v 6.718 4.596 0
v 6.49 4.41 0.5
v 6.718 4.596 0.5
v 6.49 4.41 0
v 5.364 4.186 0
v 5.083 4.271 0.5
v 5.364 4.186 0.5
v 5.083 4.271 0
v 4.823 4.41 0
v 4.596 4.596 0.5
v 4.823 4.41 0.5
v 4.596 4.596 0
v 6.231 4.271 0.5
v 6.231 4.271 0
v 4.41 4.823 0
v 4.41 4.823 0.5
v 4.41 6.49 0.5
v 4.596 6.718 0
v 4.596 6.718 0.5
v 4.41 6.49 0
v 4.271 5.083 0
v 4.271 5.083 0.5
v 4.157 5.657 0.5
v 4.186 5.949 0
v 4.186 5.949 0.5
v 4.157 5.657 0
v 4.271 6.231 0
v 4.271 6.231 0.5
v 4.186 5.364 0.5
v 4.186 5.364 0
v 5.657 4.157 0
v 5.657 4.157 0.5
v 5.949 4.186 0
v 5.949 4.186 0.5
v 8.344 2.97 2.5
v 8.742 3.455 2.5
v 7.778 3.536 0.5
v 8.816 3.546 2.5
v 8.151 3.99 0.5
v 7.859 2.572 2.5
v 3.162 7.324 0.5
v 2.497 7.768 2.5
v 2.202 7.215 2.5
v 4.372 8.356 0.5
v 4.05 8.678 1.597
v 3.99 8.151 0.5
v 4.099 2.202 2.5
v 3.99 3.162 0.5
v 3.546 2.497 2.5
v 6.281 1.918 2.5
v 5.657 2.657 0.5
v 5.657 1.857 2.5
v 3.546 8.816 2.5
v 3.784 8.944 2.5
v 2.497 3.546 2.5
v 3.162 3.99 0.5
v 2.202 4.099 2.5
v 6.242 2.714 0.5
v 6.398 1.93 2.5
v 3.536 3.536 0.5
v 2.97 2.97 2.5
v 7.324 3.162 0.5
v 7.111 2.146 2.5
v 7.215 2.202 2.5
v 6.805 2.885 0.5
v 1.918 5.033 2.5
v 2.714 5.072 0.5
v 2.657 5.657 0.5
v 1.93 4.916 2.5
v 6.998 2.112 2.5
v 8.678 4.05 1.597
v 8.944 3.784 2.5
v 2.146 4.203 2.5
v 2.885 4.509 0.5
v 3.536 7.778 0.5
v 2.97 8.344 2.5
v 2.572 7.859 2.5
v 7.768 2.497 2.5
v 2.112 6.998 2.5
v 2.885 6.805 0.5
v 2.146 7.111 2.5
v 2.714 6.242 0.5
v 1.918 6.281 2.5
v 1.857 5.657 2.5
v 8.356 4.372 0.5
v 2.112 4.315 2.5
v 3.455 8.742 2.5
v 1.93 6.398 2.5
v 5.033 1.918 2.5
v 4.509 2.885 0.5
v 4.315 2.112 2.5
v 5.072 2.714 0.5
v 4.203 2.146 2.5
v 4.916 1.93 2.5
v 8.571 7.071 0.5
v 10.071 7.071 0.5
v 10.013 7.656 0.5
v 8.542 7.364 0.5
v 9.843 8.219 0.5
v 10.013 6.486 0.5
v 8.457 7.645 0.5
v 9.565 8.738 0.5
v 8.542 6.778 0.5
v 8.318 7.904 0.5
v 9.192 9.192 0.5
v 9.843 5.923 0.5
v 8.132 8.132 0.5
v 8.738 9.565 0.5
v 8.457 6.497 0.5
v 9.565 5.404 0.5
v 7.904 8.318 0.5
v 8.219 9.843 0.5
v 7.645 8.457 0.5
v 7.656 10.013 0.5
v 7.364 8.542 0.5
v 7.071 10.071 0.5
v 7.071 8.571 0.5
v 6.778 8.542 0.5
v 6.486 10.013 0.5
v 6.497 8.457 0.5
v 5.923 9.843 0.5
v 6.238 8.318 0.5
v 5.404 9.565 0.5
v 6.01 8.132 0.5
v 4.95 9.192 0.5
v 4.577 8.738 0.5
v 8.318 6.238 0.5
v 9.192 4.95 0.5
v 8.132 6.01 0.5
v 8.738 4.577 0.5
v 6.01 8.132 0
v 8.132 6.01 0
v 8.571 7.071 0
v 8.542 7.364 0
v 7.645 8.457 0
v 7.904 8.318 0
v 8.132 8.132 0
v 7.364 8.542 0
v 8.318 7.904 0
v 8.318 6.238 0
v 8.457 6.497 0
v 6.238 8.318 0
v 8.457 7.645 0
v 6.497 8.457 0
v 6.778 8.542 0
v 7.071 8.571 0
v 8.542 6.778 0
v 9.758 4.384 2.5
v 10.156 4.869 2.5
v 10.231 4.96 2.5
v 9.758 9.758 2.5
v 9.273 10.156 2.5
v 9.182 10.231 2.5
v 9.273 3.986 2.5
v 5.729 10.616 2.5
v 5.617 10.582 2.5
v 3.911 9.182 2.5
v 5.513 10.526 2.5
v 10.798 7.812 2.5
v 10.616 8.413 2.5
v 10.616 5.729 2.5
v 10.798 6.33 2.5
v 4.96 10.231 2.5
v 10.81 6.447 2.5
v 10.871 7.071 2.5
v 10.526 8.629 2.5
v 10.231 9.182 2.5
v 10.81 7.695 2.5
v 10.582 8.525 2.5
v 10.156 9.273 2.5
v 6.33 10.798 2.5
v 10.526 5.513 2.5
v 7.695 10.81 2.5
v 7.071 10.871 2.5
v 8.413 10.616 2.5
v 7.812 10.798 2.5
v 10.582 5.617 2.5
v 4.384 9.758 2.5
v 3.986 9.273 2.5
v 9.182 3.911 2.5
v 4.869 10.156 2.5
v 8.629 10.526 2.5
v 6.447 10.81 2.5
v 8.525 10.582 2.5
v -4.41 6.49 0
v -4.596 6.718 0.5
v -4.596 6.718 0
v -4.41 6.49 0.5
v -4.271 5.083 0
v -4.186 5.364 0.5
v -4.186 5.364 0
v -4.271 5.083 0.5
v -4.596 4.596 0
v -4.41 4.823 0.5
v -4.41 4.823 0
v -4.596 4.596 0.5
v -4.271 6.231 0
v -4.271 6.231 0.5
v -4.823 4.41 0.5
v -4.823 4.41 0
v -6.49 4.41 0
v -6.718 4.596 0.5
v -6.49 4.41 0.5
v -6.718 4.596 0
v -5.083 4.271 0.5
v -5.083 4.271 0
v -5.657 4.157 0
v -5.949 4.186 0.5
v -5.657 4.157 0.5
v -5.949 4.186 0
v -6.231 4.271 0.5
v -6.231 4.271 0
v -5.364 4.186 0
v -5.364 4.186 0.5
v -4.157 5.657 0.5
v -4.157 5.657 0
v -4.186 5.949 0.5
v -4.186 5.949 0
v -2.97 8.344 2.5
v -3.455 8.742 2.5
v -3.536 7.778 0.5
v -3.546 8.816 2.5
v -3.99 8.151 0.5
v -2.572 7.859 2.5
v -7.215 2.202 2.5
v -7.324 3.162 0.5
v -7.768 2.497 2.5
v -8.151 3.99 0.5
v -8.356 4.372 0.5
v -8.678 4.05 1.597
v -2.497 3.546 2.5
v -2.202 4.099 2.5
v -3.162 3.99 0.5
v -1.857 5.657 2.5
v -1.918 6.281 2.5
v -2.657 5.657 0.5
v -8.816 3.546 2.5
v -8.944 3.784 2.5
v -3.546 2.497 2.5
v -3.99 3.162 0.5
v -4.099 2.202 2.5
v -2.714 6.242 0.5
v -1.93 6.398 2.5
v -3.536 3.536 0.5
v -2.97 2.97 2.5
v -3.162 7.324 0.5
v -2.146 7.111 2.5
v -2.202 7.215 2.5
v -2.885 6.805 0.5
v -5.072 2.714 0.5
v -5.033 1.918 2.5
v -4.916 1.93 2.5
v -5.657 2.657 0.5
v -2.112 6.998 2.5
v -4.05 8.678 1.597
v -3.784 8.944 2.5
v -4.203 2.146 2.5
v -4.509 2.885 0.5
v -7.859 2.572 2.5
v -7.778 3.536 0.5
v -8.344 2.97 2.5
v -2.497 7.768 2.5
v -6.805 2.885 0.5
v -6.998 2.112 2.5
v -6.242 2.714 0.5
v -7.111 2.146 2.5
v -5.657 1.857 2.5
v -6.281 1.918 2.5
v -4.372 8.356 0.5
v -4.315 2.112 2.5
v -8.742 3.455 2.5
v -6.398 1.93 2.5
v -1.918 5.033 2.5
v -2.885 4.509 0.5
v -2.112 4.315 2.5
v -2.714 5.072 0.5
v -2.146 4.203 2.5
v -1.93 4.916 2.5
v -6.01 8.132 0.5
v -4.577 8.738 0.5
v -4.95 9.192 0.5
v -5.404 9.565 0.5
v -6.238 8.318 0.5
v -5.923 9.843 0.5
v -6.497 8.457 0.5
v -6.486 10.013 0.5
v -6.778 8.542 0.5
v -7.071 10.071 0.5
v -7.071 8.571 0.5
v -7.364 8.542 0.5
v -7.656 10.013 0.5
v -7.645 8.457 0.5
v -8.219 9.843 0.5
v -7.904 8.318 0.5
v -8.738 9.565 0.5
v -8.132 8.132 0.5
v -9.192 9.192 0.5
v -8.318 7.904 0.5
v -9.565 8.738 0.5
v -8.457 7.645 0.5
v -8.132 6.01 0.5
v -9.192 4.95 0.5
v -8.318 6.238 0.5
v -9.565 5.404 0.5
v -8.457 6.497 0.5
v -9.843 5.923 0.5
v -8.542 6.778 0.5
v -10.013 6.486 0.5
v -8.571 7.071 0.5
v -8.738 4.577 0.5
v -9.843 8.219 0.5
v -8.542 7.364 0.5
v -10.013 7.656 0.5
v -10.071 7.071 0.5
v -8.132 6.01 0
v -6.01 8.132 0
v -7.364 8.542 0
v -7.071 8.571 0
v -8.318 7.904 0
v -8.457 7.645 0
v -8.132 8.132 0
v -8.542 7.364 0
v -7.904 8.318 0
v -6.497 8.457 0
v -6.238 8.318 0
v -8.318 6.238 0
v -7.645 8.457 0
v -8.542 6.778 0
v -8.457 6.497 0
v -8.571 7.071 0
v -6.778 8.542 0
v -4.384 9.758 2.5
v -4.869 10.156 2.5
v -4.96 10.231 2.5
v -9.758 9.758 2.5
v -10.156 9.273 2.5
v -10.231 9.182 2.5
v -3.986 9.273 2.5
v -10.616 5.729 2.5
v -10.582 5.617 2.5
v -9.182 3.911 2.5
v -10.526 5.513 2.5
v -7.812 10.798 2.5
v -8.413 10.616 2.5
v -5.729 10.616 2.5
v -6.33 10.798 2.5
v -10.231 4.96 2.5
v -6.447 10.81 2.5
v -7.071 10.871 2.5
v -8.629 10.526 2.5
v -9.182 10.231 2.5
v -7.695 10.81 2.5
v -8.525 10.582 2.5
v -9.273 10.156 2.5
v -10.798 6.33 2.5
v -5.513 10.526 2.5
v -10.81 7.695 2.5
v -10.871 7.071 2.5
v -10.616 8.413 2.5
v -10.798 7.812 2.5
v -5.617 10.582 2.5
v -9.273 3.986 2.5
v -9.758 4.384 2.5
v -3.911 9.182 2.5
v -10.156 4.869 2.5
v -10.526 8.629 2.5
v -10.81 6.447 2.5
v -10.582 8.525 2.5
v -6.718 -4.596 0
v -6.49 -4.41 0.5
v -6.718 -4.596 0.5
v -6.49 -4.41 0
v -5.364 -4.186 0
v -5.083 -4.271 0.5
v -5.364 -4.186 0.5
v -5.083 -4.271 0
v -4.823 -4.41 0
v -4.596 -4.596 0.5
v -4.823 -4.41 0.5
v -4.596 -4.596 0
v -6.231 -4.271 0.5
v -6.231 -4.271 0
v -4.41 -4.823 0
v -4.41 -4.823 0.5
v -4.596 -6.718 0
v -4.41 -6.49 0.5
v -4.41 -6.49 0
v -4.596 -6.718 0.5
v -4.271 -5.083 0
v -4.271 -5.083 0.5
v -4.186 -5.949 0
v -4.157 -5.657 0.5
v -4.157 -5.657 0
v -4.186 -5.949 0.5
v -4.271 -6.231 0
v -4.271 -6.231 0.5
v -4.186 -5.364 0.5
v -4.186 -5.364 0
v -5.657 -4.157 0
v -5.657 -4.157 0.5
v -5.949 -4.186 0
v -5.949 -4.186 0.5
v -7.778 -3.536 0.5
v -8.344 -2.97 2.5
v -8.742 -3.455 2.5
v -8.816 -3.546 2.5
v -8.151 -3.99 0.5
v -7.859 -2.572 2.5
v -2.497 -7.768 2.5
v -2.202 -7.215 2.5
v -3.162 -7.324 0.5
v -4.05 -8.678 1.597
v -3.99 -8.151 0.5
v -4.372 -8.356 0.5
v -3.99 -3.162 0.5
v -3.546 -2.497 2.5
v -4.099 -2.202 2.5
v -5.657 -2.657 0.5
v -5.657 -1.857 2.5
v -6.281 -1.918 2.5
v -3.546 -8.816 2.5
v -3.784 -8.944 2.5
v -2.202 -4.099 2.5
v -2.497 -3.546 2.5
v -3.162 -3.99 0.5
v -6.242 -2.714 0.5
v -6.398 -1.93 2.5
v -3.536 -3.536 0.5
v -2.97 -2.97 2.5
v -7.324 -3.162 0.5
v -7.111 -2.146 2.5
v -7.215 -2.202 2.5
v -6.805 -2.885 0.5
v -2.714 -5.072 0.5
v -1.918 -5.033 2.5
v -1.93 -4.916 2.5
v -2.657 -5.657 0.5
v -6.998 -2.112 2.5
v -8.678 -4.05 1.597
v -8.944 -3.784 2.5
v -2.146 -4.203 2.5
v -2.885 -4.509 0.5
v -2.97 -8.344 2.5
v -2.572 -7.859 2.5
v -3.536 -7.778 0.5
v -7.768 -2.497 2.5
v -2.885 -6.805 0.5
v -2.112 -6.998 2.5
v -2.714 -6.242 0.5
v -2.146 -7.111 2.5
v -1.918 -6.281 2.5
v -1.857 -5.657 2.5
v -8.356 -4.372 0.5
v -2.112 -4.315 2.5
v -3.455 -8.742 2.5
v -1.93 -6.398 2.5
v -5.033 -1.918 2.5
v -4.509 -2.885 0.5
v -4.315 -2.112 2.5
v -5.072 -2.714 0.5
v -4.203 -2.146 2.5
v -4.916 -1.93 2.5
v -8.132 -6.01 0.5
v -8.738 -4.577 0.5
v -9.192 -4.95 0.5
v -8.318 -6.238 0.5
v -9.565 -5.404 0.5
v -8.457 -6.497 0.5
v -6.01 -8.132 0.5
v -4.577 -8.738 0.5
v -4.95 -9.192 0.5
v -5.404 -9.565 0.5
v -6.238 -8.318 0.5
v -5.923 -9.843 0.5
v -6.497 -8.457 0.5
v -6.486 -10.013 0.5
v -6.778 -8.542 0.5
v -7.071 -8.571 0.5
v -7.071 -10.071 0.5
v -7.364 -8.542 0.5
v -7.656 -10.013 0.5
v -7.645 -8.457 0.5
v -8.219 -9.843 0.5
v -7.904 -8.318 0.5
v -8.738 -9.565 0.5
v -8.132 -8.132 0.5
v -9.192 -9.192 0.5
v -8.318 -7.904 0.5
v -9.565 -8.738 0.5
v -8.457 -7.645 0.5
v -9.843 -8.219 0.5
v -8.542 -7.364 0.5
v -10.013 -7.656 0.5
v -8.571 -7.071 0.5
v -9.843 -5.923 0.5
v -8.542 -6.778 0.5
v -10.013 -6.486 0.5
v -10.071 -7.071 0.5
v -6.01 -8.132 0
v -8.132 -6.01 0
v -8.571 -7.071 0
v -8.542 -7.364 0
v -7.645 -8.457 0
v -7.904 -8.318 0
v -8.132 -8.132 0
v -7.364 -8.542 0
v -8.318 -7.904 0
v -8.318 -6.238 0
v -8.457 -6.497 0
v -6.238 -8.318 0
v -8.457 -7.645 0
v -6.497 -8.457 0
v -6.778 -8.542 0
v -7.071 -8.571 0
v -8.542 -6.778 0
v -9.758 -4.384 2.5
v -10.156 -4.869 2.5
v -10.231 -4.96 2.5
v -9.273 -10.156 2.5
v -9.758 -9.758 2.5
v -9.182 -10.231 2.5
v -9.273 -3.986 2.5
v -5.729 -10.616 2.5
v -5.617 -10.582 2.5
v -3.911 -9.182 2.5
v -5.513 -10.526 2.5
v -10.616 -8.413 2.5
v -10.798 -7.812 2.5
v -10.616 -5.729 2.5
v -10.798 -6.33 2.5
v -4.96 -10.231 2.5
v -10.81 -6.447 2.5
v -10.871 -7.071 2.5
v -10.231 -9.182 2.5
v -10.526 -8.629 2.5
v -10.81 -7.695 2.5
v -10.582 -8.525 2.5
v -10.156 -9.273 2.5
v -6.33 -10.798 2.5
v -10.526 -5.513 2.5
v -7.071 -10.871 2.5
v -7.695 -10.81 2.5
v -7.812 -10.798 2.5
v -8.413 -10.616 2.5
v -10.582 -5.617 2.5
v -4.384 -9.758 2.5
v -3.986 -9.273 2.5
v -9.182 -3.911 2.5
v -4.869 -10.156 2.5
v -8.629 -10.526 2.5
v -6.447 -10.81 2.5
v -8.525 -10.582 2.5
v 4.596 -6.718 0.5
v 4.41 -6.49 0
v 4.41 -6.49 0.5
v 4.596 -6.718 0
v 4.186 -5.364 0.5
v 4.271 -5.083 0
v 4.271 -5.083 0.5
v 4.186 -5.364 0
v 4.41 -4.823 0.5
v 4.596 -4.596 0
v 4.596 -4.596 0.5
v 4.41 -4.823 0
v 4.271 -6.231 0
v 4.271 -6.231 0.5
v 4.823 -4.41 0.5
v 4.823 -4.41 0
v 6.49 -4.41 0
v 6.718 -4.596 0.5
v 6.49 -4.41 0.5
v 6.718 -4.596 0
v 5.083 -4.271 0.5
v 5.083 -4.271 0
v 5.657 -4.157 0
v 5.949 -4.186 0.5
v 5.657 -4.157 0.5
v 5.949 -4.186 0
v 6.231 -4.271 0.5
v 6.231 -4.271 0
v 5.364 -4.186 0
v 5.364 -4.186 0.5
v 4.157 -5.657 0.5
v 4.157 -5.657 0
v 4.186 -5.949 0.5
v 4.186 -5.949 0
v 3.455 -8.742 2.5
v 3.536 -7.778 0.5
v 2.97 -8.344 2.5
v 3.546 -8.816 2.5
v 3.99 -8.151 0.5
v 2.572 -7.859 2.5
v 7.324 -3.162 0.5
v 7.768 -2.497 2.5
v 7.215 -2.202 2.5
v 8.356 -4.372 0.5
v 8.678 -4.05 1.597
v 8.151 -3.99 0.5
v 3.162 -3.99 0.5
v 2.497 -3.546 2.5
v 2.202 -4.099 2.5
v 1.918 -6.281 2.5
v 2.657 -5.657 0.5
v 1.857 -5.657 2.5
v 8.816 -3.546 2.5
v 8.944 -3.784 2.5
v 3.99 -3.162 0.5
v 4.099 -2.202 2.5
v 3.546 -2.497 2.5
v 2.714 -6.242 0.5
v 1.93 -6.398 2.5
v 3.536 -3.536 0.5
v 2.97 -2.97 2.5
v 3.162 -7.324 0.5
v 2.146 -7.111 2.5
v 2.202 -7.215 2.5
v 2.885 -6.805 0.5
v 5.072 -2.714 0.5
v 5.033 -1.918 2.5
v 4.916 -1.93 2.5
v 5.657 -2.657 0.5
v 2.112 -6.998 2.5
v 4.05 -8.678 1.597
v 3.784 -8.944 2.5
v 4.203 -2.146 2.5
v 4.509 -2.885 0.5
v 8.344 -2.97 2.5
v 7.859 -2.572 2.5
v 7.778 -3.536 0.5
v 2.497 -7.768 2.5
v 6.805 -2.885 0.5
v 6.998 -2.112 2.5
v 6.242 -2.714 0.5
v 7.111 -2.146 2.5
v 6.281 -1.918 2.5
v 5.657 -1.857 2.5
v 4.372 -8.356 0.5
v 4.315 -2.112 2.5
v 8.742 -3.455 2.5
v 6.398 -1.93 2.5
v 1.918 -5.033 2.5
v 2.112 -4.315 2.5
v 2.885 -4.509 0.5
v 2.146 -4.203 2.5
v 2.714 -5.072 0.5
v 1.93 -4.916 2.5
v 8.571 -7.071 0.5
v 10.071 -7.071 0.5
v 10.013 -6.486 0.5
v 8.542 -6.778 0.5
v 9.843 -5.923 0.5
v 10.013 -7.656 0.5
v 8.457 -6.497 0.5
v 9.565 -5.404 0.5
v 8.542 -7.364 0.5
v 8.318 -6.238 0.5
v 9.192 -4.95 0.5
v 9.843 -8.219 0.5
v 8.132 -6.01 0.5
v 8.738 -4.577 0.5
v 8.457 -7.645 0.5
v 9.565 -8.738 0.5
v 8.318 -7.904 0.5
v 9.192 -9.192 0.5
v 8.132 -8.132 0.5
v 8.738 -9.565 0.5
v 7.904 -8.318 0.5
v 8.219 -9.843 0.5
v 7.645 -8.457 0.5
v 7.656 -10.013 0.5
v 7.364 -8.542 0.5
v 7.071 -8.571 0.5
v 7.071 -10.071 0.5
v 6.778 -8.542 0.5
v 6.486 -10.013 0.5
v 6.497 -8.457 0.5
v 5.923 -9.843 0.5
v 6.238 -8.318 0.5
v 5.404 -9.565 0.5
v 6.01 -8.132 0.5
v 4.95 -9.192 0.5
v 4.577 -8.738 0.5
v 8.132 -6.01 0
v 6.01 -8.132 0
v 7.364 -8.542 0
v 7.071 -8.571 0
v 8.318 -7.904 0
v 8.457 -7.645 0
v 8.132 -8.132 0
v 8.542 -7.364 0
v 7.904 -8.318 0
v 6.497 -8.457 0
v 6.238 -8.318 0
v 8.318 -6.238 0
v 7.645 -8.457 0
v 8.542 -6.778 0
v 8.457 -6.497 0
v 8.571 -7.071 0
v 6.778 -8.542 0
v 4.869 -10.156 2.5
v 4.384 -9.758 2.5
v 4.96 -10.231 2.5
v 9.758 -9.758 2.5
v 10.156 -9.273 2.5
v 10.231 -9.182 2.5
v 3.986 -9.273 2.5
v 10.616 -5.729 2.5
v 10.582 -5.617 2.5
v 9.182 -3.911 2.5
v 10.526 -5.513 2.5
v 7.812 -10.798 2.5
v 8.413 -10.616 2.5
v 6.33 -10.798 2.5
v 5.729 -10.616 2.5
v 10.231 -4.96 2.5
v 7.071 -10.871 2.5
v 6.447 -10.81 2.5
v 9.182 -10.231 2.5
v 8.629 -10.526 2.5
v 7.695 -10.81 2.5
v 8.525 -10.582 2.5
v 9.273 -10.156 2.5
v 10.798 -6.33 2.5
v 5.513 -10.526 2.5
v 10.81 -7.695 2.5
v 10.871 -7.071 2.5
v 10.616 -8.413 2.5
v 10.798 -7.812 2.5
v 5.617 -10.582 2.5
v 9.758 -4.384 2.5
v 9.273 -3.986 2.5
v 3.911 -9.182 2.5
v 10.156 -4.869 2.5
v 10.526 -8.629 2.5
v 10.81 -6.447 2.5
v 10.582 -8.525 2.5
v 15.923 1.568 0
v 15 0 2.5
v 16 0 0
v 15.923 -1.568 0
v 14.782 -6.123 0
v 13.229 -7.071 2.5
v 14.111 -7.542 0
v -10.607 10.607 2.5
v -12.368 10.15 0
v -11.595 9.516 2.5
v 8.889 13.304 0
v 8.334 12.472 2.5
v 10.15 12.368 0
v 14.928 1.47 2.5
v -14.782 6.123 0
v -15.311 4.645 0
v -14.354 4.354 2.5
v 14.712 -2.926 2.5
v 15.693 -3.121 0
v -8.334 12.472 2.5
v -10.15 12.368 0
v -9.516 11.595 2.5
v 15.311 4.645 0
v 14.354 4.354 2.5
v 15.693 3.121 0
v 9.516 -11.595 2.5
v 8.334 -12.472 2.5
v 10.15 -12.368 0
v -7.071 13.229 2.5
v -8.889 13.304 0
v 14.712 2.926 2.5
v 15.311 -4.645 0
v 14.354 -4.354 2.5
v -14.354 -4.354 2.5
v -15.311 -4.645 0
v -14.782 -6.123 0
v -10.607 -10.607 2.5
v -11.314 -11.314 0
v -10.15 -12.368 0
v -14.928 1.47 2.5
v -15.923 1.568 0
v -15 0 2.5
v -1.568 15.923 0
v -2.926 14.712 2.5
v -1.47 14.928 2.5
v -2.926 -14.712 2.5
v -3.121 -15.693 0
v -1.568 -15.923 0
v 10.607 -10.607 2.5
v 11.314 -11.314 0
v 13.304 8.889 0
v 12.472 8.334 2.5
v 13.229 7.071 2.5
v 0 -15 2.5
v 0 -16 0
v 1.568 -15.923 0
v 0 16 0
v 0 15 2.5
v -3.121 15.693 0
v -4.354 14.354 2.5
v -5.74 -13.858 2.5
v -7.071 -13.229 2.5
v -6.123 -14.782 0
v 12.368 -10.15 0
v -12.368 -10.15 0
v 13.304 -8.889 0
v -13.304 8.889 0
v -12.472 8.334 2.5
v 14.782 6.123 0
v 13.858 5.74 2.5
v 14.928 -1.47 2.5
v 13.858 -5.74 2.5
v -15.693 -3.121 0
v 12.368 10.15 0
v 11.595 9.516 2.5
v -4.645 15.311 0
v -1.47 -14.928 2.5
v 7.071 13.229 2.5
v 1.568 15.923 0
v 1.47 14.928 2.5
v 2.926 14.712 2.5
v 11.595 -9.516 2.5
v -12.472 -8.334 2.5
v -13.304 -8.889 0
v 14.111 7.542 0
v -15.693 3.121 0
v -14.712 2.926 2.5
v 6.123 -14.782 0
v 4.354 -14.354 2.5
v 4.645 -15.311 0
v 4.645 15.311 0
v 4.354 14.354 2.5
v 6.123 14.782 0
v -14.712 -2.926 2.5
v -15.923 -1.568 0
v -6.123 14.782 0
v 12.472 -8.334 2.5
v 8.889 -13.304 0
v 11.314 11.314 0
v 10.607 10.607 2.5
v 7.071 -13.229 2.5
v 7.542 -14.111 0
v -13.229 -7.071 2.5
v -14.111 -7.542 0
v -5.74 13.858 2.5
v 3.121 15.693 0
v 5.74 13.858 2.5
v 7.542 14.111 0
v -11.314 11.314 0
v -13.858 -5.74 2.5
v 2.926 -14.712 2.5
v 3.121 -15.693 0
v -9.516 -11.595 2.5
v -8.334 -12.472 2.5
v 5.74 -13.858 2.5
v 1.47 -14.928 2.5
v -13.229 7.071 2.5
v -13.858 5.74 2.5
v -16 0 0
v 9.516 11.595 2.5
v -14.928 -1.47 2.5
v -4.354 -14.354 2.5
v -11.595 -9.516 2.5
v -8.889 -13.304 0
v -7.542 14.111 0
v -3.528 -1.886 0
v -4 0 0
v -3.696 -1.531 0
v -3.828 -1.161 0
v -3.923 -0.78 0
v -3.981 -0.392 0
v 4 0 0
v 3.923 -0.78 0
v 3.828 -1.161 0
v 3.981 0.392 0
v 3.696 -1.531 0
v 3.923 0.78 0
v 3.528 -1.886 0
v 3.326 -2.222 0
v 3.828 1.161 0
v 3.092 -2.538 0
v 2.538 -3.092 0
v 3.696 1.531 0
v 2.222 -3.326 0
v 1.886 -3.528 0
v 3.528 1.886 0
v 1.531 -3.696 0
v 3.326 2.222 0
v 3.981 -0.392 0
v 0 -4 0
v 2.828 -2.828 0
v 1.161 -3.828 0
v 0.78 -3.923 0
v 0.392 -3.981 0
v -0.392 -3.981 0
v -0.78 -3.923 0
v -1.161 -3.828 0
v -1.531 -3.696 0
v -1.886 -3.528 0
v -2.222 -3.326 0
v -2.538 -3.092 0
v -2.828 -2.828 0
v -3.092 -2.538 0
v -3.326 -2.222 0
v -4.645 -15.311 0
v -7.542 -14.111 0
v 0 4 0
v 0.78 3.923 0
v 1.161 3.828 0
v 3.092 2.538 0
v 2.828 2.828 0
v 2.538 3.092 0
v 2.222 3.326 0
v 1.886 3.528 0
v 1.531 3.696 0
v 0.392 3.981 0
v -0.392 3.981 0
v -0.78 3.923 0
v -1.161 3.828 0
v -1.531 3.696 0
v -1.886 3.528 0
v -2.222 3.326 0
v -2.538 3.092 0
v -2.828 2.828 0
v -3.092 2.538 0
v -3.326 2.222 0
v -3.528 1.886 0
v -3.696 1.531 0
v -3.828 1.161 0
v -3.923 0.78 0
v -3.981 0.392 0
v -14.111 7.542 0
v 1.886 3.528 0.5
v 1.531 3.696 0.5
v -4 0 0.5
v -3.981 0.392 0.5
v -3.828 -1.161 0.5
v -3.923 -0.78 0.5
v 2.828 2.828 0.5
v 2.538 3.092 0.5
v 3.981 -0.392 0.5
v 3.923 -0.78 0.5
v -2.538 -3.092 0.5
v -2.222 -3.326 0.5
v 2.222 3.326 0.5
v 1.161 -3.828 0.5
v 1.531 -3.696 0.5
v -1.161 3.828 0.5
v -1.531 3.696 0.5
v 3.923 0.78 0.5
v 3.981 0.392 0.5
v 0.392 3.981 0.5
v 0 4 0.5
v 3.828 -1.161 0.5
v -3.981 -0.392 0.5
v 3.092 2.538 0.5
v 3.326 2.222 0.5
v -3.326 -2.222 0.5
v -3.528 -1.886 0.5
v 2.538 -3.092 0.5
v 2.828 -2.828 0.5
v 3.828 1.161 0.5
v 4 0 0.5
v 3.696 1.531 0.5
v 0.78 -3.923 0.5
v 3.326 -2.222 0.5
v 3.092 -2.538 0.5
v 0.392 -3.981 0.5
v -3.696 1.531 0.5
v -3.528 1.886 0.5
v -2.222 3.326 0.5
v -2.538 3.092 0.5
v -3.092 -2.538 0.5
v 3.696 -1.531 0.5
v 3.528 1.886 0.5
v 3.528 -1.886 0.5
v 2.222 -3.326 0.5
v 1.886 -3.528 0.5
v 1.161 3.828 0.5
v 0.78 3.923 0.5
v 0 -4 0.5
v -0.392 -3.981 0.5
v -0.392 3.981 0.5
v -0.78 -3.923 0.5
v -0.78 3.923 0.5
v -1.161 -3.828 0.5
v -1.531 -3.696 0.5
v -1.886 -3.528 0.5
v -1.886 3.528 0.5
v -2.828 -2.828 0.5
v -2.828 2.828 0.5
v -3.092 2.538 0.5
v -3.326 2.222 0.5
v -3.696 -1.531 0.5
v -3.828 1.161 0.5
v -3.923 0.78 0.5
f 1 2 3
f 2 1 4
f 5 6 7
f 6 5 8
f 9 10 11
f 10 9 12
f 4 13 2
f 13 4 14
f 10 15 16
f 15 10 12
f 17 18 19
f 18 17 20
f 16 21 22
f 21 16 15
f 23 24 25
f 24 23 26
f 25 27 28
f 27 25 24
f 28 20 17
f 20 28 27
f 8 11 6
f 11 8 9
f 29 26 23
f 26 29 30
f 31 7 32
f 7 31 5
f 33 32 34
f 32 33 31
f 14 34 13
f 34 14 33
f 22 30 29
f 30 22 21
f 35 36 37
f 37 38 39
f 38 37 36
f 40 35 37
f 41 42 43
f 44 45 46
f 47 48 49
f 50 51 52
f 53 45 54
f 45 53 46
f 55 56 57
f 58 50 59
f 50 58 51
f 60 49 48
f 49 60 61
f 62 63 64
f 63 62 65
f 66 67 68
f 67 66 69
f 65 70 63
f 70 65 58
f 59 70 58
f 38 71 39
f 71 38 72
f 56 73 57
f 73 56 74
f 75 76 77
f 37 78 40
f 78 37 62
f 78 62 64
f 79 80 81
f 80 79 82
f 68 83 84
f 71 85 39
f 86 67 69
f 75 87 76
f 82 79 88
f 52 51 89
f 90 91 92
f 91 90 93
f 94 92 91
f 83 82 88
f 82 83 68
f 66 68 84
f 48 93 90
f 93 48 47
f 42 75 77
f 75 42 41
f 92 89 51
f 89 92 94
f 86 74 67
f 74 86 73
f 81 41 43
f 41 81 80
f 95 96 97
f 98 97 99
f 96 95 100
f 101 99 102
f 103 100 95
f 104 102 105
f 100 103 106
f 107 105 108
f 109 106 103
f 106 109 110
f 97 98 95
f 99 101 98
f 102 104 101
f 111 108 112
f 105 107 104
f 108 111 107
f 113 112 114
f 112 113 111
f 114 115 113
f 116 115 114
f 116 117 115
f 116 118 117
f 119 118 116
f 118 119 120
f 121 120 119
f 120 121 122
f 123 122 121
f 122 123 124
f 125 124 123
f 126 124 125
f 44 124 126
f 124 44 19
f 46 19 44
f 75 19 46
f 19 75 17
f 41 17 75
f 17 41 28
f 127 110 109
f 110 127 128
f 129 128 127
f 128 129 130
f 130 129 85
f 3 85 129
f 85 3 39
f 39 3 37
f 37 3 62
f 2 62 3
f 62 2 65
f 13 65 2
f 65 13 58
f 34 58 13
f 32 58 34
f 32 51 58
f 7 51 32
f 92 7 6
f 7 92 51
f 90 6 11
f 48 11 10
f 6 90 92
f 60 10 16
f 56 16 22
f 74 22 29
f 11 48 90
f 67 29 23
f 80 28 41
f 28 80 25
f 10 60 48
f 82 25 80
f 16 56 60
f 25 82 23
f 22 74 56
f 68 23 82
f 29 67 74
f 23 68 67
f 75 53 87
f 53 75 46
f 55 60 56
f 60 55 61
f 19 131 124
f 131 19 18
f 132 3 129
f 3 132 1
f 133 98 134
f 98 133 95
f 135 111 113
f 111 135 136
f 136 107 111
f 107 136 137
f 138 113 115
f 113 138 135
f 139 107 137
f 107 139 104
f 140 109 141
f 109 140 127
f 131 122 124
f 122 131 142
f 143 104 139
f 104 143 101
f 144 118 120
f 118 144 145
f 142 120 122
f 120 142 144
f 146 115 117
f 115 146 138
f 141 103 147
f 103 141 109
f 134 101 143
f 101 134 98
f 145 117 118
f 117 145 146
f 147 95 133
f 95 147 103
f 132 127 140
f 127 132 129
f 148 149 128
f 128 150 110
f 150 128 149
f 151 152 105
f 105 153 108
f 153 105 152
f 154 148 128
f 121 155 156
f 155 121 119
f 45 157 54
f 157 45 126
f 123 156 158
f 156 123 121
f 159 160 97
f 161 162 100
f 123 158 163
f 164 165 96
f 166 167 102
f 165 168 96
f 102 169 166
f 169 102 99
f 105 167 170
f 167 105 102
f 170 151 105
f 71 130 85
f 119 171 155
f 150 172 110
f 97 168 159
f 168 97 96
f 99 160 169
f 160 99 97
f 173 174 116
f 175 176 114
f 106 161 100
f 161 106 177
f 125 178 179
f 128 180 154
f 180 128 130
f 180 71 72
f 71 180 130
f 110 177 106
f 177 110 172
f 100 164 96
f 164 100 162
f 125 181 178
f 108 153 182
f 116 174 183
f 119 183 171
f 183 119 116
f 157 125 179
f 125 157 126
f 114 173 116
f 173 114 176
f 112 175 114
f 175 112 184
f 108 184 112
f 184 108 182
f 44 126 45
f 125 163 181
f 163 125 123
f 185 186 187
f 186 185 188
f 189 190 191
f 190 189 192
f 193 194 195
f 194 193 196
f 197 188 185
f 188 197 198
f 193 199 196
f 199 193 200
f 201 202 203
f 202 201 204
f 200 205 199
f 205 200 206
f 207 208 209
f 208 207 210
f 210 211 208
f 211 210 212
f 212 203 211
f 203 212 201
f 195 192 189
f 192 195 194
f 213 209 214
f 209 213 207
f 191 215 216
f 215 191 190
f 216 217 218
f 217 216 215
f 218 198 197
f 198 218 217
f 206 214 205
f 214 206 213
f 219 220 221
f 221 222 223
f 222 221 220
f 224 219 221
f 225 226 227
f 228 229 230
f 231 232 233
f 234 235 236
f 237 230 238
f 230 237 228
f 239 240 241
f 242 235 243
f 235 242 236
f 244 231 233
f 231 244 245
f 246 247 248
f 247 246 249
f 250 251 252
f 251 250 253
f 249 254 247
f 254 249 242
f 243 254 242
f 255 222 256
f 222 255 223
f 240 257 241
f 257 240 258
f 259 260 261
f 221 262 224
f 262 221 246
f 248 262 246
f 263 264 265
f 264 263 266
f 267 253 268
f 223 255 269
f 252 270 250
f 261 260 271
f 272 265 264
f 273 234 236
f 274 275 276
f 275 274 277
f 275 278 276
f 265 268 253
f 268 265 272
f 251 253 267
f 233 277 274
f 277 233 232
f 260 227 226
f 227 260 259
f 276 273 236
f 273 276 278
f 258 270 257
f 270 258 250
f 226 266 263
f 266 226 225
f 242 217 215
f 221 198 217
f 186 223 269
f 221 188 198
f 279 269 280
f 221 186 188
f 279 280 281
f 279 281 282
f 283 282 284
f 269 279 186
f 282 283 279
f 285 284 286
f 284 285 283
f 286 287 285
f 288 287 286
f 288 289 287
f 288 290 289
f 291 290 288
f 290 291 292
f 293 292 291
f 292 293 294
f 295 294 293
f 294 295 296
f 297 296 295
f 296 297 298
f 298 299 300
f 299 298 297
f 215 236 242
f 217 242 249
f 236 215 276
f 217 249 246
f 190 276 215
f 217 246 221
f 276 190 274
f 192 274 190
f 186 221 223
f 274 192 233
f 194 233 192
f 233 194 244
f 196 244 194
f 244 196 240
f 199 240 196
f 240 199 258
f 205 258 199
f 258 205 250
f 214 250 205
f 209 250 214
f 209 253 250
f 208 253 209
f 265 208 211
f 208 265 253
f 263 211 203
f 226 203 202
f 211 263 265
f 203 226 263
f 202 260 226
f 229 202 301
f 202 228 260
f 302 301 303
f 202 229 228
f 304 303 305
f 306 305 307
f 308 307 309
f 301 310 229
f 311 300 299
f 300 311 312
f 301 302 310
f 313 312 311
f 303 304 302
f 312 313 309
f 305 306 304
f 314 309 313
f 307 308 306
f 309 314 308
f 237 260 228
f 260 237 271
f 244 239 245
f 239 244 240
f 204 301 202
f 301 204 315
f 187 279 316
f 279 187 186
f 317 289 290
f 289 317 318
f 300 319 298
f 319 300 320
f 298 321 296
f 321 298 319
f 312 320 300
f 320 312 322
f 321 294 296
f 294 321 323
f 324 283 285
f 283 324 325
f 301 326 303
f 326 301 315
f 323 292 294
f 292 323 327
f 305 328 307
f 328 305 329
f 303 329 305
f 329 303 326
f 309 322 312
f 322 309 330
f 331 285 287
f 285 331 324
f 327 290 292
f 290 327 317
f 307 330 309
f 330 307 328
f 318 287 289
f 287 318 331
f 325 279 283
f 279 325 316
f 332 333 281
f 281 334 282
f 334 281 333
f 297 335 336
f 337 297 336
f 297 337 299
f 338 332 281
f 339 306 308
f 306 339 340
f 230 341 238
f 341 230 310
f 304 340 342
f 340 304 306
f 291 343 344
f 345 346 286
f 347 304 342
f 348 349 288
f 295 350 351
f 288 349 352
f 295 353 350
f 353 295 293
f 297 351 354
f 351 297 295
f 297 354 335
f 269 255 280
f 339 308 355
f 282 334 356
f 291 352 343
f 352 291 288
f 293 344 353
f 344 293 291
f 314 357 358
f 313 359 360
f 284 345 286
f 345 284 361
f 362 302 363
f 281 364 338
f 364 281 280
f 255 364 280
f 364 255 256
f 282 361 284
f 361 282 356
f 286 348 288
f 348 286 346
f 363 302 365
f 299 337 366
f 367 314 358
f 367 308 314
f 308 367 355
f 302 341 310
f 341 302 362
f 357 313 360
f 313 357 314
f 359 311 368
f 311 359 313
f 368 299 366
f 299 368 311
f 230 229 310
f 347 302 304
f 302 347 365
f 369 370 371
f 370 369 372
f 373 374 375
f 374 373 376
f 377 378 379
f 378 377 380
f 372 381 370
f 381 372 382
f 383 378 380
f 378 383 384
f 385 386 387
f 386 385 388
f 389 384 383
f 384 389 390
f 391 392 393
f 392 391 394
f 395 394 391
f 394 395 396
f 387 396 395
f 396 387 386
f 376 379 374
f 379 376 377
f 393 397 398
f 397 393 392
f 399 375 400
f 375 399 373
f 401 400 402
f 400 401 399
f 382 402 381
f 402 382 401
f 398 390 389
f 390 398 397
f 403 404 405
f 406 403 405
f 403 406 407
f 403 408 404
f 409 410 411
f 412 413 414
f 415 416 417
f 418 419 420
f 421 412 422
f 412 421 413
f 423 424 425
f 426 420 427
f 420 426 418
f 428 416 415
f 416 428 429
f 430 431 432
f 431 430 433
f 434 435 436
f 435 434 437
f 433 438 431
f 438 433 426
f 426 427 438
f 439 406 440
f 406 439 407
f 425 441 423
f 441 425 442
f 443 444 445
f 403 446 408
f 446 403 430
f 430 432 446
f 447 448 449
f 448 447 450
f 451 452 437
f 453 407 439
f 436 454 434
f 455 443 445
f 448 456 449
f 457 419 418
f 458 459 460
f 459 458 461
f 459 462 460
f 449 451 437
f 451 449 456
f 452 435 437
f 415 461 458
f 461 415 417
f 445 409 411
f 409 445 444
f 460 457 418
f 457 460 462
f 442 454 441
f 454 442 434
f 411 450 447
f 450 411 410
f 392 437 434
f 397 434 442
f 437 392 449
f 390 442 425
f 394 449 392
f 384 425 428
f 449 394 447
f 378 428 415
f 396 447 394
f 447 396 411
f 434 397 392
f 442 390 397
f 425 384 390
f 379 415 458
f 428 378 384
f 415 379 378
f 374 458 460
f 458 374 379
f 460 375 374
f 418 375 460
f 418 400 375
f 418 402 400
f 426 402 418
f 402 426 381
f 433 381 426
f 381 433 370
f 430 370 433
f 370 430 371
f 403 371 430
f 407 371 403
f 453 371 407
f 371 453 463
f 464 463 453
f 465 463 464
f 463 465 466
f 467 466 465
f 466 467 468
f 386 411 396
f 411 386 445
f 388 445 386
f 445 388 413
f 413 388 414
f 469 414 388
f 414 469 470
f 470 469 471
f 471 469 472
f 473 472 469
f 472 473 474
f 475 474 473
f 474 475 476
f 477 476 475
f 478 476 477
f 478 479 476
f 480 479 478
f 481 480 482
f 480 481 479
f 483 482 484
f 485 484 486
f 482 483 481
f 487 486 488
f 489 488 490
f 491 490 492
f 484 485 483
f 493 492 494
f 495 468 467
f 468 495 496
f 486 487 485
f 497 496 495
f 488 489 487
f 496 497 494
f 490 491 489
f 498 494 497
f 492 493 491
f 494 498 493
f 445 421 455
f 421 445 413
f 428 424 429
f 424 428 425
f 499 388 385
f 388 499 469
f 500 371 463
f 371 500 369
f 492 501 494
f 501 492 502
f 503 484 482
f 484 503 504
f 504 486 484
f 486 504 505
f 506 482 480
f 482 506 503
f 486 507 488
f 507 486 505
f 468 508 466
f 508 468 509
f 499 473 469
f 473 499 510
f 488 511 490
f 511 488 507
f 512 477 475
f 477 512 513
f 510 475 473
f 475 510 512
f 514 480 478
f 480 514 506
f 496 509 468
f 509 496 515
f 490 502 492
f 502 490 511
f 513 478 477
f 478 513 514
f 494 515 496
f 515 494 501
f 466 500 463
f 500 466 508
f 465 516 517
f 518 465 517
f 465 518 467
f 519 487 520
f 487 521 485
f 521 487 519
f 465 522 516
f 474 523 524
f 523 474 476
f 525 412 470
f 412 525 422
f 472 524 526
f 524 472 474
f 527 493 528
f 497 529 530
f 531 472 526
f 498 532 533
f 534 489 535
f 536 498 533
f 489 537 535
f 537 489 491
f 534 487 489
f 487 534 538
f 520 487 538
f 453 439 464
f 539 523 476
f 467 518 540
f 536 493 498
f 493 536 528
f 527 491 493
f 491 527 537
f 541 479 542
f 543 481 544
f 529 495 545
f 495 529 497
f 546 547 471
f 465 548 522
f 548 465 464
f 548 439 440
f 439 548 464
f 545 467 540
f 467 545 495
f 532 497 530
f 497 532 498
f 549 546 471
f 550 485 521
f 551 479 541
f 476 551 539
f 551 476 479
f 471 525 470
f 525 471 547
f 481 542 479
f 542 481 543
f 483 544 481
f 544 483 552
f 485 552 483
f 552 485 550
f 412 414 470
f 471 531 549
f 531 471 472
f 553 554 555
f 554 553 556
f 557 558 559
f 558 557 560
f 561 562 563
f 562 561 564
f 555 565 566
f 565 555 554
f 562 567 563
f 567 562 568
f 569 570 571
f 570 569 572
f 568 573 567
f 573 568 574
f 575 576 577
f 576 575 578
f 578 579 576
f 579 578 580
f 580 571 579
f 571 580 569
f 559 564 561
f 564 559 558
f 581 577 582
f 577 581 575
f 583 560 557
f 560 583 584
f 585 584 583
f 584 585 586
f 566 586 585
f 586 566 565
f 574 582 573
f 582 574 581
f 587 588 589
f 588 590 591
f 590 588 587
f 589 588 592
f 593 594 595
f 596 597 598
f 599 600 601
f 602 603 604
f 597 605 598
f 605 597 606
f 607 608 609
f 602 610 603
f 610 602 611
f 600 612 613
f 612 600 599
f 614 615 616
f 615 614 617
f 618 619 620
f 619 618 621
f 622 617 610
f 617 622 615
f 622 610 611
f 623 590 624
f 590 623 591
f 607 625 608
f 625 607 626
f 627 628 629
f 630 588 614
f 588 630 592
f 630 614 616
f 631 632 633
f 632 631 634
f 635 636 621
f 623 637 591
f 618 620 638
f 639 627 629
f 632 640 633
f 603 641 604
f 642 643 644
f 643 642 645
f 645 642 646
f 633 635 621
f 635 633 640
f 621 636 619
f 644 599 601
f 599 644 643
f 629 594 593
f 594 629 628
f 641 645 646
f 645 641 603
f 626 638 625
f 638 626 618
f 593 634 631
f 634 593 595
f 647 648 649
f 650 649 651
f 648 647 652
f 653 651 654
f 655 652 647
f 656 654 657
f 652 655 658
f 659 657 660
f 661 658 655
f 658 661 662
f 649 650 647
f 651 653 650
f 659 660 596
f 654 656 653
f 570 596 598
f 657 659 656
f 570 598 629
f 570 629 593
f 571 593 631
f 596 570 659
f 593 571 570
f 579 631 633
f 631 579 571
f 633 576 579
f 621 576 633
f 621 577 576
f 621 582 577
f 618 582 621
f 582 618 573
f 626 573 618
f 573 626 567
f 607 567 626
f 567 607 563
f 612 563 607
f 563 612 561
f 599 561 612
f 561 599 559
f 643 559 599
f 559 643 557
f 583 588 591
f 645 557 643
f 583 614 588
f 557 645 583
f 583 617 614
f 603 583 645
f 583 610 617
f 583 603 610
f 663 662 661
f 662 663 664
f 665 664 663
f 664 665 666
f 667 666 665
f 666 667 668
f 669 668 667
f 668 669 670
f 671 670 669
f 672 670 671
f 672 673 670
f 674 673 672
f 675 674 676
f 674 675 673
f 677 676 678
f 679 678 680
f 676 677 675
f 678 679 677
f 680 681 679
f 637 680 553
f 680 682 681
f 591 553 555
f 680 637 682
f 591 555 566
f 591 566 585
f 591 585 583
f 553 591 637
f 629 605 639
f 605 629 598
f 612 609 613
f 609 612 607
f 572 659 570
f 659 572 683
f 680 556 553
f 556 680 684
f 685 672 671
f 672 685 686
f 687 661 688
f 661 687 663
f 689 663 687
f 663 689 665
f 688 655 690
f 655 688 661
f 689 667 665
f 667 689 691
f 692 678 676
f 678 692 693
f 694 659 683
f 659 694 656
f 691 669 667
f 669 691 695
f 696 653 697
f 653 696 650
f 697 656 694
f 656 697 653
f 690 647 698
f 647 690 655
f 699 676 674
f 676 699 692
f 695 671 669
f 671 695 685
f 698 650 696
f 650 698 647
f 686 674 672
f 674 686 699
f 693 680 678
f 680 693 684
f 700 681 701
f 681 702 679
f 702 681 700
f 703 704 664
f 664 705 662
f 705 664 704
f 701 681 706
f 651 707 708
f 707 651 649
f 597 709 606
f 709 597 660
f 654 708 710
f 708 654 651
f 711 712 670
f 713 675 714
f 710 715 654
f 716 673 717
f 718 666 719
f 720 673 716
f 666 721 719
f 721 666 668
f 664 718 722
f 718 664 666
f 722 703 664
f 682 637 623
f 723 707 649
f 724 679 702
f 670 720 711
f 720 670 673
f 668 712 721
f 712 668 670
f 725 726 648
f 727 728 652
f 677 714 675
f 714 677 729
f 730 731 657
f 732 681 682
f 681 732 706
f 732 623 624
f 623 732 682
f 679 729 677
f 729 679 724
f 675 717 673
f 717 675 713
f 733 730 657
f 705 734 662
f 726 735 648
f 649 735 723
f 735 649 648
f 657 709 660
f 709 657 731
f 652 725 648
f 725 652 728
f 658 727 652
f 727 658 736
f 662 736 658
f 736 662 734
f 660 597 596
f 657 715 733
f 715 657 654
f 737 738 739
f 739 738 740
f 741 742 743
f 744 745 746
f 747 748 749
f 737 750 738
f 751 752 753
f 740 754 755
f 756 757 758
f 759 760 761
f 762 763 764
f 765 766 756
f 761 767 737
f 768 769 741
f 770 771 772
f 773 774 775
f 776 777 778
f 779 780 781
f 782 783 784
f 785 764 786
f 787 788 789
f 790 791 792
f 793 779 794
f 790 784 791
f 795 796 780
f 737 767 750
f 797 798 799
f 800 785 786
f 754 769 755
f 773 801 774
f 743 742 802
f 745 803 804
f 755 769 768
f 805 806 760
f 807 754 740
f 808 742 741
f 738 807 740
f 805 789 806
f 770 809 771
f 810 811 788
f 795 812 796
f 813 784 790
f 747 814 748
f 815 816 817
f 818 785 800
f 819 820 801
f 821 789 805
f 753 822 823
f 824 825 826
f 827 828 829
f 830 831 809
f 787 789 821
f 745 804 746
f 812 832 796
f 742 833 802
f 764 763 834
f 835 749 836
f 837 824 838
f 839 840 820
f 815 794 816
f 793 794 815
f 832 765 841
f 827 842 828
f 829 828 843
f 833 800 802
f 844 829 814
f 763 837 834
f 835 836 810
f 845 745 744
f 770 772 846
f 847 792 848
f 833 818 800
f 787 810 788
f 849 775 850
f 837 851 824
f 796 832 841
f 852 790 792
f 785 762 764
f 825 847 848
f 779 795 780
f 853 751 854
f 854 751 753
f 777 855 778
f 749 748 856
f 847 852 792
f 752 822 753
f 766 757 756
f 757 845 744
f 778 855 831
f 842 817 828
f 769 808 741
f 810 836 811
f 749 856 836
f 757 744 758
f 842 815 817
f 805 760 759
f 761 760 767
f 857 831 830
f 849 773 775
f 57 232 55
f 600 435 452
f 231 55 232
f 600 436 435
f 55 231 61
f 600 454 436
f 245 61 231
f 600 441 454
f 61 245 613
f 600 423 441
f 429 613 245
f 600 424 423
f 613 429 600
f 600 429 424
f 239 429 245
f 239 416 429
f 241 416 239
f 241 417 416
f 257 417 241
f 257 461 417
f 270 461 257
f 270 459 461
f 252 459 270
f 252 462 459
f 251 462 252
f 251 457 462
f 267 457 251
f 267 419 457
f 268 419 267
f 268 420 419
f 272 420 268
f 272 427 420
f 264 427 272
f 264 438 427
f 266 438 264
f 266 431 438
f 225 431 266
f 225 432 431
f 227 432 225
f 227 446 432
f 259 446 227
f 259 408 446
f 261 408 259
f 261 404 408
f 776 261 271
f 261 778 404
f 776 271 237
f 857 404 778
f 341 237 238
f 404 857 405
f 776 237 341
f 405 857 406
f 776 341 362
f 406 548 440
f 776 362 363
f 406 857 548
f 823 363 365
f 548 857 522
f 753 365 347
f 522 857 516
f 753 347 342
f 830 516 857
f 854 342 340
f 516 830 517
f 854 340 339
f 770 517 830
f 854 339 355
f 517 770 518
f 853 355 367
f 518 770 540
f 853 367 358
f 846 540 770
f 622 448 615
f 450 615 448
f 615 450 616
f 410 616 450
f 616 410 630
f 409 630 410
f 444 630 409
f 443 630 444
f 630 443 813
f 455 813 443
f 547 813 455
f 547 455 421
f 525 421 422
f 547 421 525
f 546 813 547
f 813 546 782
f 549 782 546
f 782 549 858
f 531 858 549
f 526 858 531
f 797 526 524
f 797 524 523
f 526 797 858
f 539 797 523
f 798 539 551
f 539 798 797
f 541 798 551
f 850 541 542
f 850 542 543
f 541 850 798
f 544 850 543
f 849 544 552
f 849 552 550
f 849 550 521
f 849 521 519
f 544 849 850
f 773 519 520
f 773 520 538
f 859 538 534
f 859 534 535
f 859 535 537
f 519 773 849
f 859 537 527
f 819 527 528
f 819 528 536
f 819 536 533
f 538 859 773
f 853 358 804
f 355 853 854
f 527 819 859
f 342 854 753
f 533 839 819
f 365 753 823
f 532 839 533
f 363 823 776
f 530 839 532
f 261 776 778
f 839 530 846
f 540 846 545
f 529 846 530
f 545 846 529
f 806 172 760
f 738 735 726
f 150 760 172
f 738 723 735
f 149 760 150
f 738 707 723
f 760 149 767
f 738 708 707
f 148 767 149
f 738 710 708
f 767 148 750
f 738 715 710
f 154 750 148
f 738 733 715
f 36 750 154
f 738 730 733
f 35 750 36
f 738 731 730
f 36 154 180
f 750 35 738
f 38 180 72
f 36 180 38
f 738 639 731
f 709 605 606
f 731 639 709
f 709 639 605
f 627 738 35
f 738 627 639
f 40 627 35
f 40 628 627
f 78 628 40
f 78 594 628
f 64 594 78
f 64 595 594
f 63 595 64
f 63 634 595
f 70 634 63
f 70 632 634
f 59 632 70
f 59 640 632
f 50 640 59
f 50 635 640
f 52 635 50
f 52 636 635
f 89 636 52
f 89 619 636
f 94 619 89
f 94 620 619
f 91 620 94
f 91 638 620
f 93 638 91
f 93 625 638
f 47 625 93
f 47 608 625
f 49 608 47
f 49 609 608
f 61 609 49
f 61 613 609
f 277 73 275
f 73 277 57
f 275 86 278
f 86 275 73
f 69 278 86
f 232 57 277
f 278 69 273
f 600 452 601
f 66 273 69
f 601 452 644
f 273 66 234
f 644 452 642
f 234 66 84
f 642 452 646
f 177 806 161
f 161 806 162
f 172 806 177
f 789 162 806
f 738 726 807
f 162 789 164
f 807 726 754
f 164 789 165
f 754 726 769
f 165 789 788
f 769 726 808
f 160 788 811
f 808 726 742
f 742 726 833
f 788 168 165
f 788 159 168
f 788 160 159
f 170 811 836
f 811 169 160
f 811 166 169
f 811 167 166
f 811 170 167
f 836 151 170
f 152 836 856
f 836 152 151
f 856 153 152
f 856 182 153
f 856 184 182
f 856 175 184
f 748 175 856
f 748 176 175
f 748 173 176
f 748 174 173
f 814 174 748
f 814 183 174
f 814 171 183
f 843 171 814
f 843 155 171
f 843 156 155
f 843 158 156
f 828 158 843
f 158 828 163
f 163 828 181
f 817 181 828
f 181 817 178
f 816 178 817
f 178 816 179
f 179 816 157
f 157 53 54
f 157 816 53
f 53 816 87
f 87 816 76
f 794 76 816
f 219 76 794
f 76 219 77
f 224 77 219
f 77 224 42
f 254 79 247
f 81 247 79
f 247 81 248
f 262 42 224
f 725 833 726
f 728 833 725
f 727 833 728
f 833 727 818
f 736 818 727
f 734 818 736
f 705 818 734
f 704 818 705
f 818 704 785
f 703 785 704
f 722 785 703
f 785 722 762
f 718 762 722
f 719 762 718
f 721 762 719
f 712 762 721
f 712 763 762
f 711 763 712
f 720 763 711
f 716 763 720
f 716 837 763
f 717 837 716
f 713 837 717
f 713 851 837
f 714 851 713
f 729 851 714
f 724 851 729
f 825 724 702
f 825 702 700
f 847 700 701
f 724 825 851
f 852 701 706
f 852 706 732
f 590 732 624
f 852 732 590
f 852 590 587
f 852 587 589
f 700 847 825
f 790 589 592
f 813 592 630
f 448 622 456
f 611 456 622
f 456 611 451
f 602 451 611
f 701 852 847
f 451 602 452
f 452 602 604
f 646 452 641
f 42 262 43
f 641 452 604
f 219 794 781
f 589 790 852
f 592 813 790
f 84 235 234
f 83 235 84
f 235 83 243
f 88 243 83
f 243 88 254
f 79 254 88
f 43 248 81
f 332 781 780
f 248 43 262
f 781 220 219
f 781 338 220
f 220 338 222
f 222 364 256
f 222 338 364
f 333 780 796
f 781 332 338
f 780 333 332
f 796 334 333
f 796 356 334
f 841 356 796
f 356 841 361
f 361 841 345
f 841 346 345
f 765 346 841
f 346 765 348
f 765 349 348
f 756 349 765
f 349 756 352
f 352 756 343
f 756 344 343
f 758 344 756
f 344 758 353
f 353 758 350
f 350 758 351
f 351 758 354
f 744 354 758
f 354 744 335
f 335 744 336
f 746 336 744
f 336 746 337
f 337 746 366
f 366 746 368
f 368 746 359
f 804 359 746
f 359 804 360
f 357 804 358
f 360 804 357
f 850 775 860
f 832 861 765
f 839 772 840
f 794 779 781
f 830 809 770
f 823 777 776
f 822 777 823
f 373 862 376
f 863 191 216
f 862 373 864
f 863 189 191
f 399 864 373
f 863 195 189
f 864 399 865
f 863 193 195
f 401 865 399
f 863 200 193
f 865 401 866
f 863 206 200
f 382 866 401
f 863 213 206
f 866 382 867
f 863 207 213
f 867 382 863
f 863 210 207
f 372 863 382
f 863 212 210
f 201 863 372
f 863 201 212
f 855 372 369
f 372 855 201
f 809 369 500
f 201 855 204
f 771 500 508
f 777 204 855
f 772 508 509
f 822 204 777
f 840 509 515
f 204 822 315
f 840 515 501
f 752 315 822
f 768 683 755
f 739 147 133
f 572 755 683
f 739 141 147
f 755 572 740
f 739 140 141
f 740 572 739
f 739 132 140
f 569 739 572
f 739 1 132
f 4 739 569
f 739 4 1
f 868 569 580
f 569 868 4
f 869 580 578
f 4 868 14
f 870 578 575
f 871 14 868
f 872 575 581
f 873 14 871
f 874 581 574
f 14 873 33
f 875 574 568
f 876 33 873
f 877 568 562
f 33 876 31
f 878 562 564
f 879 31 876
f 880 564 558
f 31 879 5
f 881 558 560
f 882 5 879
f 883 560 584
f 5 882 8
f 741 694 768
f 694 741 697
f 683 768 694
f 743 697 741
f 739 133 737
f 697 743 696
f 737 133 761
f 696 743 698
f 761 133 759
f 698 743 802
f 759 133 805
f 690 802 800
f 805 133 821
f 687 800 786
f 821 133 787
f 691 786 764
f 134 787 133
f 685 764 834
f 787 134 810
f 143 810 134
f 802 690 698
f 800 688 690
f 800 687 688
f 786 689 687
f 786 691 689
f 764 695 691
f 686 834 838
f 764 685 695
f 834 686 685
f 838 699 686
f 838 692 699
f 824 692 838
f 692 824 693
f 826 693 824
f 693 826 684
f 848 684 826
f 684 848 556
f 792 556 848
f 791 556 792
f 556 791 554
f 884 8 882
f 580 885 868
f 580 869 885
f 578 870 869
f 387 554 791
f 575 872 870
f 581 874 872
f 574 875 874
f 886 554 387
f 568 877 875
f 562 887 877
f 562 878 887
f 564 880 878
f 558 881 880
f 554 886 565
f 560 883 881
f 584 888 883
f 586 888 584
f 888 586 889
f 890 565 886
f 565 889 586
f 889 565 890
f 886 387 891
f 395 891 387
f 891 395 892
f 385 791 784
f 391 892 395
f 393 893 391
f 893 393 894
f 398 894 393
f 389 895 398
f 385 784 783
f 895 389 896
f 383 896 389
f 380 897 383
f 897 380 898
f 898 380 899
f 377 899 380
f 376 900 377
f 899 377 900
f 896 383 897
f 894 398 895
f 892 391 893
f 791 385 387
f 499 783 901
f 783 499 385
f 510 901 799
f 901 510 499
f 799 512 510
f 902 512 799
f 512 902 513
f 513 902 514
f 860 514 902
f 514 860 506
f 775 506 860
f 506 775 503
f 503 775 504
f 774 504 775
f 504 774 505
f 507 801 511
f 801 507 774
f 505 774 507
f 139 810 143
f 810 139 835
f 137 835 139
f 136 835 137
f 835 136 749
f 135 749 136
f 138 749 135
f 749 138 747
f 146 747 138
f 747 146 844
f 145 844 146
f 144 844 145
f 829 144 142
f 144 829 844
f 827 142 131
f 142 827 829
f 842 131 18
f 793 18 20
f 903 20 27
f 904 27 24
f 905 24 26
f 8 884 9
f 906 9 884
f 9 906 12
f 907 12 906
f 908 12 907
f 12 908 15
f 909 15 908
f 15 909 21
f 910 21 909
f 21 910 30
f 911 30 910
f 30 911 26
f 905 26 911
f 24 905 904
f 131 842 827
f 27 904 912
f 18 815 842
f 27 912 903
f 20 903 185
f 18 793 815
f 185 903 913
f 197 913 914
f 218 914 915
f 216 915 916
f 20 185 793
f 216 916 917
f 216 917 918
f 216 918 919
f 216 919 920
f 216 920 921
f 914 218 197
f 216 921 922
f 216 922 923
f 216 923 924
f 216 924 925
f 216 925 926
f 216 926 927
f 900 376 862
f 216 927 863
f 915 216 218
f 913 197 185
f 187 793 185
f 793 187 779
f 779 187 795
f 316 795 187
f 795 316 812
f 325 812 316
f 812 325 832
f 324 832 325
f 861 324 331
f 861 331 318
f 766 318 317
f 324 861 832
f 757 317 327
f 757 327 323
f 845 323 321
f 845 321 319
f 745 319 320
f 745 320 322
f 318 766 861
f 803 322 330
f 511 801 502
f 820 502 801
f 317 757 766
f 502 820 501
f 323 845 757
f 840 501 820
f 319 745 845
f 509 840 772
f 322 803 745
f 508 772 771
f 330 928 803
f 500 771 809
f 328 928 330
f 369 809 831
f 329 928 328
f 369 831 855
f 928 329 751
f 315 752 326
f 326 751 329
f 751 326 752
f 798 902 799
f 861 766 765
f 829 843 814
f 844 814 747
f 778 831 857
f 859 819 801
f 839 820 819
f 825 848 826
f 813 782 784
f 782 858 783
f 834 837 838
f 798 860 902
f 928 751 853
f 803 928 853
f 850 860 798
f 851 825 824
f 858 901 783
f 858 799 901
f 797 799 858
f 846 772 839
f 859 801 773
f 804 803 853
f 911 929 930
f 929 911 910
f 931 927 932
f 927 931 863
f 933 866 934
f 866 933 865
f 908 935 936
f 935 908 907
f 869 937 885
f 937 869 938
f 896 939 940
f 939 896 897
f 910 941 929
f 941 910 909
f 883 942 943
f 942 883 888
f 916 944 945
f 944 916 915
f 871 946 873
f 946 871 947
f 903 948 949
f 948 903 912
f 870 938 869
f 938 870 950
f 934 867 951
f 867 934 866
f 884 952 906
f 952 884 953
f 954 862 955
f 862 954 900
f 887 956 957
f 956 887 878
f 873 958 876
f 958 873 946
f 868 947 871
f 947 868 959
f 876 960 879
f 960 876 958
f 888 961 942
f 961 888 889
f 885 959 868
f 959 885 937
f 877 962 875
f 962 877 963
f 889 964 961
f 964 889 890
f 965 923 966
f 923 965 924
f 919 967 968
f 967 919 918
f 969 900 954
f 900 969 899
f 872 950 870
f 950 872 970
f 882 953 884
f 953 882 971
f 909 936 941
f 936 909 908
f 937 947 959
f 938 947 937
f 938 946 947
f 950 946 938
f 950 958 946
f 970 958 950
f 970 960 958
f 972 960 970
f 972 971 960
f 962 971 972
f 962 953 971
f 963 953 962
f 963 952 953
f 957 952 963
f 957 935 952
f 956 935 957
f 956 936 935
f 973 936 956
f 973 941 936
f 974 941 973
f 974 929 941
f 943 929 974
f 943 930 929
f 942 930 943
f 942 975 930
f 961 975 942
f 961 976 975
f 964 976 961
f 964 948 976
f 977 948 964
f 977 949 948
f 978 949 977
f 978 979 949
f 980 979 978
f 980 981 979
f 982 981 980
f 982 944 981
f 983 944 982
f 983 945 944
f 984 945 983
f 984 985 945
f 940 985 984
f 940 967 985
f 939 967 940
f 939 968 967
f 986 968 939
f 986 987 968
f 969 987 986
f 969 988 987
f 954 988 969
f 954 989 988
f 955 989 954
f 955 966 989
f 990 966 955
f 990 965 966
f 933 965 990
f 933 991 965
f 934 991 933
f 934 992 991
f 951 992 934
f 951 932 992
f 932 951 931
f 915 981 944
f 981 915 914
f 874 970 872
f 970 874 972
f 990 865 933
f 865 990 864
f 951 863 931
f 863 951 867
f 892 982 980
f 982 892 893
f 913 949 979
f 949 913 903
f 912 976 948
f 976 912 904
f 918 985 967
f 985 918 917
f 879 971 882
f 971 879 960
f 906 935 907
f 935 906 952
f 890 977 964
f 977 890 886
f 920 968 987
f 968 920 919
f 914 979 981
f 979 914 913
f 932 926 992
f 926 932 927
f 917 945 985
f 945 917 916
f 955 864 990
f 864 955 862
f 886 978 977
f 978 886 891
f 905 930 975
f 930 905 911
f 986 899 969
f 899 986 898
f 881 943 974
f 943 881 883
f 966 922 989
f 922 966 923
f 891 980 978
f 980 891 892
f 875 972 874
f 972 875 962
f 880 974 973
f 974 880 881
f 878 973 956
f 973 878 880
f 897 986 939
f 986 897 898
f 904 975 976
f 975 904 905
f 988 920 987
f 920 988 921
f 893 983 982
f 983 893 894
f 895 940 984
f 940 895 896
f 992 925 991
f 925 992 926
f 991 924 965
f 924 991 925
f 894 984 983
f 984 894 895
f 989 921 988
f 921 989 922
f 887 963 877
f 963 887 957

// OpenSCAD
armDiameter=32;
plateTilt=2;
screwHeight=0.5;
height=2.5;

motorAxleIndent=0.5;

holeDiameter=3;
holeHeadDiameter=6;
holeDistanceMin=8;
holeDistanceMax=10;

difference() {
    cylinder(d=armDiameter,d2=armDiameter-plateTilt,h=height,$fn=64);
	 cylinder(d=holeDistanceMin,h=motorAxleIndent,$fn=64);
	
    for(r=[0,90,180,270])
    {
        rotate([0,0,r+45])
        union() {
				translate([holeDistanceMin,0,-1])
				cylinder(d=holeDiameter,h=height,$fn=32);
            translate([holeDistanceMin,0,screwHeight])
            cylinder(d=holeHeadDiameter,d2=holeHeadDiameter+plateTilt,h=height,$fn=32);

				translate([holeDistanceMin,-holeDiameter/2,-1])
				cube([holeDistanceMax-holeDistanceMin,holeDiameter,height]);

				translate([holeDistanceMax,0,-1])
				cylinder(d=holeDiameter,h=height,$fn=32);
            translate([holeDistanceMax,0,screwHeight])
            cylinder(d=holeHeadDiameter,d2=holeHeadDiameter+plateTilt,h=height,$fn=32);
        }
    }
}
